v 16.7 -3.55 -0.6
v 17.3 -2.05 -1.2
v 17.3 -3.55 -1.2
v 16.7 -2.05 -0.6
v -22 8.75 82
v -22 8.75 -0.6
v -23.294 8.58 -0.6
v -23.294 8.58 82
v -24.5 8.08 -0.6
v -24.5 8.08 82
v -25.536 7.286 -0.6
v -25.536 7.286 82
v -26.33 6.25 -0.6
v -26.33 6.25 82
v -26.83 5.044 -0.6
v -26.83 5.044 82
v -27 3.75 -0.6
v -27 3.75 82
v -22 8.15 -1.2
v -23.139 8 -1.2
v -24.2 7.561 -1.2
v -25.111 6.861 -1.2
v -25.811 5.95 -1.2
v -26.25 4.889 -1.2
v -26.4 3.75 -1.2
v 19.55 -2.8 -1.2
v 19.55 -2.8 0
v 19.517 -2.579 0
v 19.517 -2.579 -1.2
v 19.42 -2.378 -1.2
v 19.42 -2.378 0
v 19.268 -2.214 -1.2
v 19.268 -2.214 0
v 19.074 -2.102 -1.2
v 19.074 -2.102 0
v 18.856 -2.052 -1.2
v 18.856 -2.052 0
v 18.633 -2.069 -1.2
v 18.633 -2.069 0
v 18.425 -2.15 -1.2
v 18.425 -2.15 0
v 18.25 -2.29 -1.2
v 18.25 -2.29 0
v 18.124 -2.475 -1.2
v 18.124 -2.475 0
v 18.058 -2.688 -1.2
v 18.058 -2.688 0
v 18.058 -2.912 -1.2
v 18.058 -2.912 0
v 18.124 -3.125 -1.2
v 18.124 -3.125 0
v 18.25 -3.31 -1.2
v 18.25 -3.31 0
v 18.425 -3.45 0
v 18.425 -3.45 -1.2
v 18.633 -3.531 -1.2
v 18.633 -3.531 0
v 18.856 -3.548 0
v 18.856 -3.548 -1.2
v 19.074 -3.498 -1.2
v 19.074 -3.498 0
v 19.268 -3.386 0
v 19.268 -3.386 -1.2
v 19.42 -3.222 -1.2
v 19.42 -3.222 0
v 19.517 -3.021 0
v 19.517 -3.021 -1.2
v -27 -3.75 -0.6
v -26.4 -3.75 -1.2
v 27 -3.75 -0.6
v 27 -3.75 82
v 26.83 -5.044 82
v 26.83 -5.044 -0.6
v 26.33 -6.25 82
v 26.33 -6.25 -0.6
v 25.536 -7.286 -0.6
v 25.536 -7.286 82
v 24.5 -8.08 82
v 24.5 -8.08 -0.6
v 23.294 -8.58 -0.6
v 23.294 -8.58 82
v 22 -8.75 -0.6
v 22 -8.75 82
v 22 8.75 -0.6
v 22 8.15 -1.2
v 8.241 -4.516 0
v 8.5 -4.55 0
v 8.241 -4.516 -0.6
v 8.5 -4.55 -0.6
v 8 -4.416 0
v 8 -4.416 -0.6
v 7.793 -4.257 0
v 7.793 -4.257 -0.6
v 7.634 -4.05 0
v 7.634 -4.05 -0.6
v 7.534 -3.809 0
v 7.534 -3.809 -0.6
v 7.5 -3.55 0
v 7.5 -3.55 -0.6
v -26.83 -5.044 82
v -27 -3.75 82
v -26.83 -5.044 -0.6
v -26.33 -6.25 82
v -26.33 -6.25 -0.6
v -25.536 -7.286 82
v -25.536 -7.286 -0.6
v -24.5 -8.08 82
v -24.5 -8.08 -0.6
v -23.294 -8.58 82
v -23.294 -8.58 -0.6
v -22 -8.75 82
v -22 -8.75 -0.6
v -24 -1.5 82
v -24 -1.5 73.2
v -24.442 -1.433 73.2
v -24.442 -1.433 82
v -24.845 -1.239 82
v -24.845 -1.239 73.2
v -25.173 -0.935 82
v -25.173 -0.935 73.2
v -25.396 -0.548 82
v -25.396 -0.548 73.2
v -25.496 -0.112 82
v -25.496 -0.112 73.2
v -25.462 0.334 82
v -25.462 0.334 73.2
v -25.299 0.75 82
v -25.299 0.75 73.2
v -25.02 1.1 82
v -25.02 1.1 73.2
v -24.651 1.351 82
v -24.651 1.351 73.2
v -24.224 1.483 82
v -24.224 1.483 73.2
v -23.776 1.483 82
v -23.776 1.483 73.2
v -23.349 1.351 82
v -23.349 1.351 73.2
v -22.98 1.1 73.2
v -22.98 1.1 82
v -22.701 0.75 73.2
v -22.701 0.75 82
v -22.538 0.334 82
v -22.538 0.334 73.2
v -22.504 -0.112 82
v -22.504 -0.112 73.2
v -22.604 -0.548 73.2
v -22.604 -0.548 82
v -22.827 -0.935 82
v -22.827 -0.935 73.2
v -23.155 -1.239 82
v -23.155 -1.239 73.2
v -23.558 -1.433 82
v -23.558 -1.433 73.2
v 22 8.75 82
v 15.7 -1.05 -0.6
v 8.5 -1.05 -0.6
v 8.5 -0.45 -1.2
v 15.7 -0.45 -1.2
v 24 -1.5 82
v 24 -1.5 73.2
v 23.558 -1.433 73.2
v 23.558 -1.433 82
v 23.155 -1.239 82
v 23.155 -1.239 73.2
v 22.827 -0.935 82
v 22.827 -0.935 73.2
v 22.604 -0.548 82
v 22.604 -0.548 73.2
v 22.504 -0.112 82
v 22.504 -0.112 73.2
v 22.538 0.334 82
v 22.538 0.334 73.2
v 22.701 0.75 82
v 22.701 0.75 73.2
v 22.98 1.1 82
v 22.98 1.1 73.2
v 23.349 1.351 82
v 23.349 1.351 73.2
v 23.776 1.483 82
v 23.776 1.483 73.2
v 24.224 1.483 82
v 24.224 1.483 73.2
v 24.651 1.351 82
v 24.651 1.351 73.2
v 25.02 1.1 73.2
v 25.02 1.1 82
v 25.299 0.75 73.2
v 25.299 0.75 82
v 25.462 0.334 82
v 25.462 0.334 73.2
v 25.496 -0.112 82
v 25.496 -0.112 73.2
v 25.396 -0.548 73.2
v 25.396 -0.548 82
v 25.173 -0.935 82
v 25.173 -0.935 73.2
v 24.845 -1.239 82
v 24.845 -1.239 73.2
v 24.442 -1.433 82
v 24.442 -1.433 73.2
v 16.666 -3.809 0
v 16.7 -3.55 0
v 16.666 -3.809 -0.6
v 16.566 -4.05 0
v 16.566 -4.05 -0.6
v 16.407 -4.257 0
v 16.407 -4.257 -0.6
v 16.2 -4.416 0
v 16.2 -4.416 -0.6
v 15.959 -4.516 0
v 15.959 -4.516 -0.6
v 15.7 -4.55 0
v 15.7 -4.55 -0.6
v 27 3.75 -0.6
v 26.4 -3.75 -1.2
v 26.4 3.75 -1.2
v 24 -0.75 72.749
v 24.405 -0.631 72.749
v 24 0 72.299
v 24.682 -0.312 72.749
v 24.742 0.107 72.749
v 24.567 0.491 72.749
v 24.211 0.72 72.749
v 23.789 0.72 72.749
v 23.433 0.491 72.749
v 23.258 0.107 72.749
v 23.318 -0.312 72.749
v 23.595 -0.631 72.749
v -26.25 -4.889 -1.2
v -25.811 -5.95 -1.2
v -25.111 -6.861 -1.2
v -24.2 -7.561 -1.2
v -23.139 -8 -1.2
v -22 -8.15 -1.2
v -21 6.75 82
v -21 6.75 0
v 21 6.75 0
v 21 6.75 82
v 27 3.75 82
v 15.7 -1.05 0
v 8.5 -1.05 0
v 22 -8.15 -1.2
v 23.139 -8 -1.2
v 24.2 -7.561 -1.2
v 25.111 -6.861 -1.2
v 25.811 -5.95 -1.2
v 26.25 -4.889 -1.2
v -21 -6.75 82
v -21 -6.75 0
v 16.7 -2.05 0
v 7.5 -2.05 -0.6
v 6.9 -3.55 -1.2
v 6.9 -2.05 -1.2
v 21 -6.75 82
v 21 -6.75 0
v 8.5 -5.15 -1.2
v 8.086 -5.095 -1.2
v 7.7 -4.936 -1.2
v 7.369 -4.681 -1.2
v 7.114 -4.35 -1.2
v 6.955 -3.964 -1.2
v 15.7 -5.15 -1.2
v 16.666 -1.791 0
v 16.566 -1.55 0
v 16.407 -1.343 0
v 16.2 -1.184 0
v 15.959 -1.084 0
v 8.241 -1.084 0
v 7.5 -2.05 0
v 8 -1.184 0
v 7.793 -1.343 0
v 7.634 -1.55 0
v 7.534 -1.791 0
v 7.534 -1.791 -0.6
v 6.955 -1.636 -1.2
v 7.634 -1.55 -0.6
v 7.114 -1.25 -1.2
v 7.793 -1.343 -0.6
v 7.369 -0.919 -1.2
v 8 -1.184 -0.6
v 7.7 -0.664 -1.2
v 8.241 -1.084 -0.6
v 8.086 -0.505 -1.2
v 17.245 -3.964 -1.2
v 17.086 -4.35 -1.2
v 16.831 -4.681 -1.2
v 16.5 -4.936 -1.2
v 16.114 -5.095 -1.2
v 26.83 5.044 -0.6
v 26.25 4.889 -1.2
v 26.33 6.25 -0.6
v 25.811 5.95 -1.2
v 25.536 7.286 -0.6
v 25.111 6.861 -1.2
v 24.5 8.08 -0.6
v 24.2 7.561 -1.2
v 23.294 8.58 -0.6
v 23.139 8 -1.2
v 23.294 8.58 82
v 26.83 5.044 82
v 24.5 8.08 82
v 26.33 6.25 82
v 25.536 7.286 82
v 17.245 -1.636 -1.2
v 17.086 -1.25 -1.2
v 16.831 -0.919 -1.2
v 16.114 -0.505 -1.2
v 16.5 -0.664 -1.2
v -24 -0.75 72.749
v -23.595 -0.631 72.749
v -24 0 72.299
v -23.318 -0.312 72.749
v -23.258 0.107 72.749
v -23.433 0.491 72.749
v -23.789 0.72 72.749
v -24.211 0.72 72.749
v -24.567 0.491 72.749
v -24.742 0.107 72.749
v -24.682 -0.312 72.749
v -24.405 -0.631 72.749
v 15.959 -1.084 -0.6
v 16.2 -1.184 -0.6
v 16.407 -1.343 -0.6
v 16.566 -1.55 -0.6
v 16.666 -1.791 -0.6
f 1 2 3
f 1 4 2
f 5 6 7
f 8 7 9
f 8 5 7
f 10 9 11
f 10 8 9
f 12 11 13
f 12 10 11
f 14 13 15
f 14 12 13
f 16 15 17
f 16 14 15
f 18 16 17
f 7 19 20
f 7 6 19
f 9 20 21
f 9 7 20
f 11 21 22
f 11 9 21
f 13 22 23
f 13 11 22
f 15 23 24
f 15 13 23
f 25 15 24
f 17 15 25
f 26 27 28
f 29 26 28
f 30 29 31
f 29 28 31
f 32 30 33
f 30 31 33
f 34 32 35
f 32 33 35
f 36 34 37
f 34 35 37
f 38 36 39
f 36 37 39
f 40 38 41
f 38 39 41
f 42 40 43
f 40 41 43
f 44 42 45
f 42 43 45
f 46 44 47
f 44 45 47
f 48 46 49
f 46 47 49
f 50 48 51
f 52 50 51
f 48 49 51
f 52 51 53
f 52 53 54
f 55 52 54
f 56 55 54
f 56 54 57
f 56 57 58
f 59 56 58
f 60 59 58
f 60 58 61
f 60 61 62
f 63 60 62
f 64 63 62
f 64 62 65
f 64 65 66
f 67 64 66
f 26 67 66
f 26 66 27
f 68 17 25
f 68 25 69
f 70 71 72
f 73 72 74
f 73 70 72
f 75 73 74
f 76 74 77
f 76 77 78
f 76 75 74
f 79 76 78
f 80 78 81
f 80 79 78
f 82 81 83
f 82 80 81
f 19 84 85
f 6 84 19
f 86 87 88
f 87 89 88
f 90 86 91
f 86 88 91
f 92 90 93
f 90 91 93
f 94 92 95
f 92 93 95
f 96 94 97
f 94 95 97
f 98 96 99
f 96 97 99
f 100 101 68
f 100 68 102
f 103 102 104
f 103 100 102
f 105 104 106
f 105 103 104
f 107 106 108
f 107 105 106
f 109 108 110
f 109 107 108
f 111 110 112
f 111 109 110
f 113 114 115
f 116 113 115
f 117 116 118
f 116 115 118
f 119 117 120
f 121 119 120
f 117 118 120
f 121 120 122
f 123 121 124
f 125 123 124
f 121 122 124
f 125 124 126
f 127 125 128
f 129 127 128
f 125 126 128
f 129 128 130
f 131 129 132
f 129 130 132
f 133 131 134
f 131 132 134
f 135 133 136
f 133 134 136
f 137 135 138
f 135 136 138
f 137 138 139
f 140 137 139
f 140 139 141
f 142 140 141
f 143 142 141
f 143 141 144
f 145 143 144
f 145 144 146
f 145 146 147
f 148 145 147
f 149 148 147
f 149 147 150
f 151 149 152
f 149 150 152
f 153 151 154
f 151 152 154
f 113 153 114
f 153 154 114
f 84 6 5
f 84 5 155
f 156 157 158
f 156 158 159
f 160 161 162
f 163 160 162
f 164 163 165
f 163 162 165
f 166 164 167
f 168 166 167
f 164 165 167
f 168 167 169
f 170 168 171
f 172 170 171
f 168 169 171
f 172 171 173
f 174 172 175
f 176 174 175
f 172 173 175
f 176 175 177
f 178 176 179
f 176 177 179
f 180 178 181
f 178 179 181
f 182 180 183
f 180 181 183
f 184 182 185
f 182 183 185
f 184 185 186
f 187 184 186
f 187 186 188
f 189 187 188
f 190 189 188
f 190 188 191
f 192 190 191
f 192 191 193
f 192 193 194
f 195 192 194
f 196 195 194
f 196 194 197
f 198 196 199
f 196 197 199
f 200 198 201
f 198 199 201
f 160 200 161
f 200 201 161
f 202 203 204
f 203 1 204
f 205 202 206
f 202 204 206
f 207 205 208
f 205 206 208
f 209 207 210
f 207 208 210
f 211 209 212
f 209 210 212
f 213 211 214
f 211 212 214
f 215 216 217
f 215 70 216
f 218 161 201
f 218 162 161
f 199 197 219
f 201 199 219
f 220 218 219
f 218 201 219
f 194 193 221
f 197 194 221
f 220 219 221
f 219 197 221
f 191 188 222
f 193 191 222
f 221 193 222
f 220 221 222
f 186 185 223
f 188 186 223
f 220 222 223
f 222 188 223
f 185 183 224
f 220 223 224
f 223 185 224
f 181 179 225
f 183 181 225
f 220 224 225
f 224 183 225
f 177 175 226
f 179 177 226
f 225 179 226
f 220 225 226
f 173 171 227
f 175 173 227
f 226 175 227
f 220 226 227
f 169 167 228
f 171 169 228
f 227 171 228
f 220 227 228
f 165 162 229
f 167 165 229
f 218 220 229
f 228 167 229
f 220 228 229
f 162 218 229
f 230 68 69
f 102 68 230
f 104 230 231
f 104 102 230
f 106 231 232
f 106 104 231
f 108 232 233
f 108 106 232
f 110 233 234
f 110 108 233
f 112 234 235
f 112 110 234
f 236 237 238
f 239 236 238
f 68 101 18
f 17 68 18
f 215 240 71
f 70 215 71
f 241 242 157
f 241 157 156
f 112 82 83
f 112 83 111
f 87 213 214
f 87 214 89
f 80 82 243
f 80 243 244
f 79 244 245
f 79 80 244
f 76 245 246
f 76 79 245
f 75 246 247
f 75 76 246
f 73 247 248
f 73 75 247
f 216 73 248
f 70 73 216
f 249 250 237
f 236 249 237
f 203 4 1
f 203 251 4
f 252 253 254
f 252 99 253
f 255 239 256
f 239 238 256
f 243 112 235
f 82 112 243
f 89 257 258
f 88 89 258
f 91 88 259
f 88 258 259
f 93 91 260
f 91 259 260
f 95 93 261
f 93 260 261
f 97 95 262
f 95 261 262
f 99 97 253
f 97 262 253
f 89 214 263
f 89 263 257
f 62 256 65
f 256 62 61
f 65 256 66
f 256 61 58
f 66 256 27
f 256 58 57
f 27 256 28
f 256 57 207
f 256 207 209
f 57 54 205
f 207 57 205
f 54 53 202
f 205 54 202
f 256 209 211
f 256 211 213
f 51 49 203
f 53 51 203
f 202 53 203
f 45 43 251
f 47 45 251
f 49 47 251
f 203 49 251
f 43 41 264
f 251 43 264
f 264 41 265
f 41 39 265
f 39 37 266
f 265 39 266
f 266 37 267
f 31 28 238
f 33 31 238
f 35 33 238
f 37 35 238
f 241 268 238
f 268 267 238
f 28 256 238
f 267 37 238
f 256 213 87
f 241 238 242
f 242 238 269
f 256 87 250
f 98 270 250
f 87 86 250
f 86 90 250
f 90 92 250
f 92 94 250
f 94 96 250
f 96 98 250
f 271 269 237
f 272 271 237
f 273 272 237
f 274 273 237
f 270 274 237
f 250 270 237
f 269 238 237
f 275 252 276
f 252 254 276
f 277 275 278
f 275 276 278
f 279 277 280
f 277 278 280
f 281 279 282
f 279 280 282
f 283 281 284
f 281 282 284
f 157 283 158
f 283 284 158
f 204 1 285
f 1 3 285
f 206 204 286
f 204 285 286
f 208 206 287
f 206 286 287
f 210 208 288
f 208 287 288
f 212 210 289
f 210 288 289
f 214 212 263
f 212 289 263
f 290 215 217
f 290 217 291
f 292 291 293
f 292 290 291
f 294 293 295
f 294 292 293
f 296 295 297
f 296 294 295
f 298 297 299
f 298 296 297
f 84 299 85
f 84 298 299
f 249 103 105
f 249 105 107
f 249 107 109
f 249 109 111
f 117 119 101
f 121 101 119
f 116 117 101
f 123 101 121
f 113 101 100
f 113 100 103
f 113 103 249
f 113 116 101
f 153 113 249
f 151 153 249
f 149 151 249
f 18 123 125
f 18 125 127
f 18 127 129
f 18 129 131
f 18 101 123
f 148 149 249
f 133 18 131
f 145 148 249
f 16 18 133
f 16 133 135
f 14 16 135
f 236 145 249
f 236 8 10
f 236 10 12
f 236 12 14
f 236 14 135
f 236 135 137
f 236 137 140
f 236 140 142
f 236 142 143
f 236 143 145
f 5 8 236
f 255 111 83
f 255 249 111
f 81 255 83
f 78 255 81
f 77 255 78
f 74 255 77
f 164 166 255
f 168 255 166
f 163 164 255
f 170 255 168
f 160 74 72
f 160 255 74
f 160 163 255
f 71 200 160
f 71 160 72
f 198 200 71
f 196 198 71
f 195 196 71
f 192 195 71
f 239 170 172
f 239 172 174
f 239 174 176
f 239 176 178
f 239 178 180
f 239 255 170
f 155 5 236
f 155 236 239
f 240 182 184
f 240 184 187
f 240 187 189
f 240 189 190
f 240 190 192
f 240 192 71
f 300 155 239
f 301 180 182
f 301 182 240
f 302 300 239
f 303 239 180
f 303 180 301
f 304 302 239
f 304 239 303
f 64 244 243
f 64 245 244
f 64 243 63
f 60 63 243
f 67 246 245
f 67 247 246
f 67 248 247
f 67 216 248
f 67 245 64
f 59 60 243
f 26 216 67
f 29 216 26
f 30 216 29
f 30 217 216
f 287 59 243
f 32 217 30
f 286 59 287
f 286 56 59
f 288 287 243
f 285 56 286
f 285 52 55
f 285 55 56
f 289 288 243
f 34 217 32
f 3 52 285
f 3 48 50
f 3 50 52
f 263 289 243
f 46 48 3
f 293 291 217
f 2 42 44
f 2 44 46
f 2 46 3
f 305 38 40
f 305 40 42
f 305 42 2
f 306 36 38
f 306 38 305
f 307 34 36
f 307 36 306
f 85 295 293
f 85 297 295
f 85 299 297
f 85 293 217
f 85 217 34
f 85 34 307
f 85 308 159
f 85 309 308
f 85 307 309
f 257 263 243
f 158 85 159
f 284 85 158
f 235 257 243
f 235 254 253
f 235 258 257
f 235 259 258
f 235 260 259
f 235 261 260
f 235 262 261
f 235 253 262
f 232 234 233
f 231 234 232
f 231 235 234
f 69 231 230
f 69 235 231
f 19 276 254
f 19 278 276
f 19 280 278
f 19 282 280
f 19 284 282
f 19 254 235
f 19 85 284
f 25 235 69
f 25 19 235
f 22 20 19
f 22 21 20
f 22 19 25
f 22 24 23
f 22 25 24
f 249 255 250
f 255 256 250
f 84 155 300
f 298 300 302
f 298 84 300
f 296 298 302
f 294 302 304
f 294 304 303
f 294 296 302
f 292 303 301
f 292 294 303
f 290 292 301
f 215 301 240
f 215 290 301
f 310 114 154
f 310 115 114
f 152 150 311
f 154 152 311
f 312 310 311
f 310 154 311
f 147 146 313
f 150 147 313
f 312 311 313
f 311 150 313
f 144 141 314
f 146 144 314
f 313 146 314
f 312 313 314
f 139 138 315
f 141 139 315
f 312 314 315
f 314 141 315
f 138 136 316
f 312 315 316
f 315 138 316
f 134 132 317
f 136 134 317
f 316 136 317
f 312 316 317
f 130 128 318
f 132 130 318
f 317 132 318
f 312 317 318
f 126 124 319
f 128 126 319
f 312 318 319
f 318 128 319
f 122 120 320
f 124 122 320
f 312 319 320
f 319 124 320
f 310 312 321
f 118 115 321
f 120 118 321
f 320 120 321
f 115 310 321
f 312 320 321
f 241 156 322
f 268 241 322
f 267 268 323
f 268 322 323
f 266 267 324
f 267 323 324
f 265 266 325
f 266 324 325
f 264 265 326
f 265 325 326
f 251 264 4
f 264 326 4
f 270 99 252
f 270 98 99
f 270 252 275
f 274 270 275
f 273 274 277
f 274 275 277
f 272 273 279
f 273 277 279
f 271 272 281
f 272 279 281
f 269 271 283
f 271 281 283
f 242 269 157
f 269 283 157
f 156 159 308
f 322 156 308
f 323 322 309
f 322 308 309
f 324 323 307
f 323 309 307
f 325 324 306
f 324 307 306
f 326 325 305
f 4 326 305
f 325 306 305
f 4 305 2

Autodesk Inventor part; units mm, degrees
ref_plane "YZ Plane" through (0, 0, 0) normal (1, 0, 0) x (0, 1, 0)
ref_plane "XZ Plane" through (0, 0, 0) normal (0, 1, 0) x (-1, 0, 0)
ref_plane "XY Plane" through (0, 0, 0) normal (0, 0, 1) x (1, 0, 0)
sketch "Sketch1" plane through (0, 0, 0) normal (0, 0, 1) x (1, 0, 0)
  point P0 (0, 0)
sketch "Sketch2" plane through (0, 0, 0) normal (0, 0, 1) x (1, 0, 0)
  line L0 (-21, 6.75) -> (21, 6.75)
  line L1 (21, 6.75) -> (21, -6.75)
  line L2 (21, -6.75) -> (-21, -6.75)
  line L3 (-21, -6.75) -> (-21, 6.75)
  line L4 (-27, 8.75) -> (27, 8.75)
  line L5 (27, 8.75) -> (27, -8.75)
  line L6 (27, -8.75) -> (-27, -8.75)
  line L7 (-27, -8.75) -> (-27, 8.75)
  point P0 (0, 0)
  dimension "d0" = 42
  dimension "d1" = 13.5
  dimension "d2" = 2
  dimension "d3" = 2
  dimension "d4" = 6
  dimension "d5" = 6
  dimension "d6" = 6.75
  dimension "d7" = 21
extrude "Extrusion1" add sketch "Sketch2" along normal blind 82
sketch "Sketch3" plane through (0, 0, 0) normal (0, 0, -1) x (-1, 0, 0)
  line L0 (-27, -8.75) -> (-27, 8.75) projected
  line L1 (27, 8.75) -> (27, -8.75) projected
  line L2 (-27, 8.75) -> (27, 8.75)
  line L3 (27, 8.75) -> (27, -8.75)
  line L4 (27, -8.75) -> (-27, -8.75)
  line L5 (-27, -8.75) -> (-27, 8.75)
  point P0 (0, 0)
extrude "Extrusion2" add sketch "Sketch3" along normal blind 1.2
fillet "Fillet1" radius 5 4 edges at (-27, 8.75, 40.4) (-27, -8.75, 40.4) (27, 8.75, 40.4) (27, -8.75, 40.4)
sketch "Sketch4" plane through (0, 0, 82) normal (0, 0, 1) x (1, 0, 0)
  line L0 (-21, -6.75) -> (-21, 6.75) projected
  line L1 (21, 6.75) -> (21, -6.75) projected
  line L2 (21, -6.75) -> (-21, -6.75) projected
  point P0 (0, 0)
  point P1 (-24, 0)
  point P2 (24, 0)
  dimension "d13" = 3
  dimension "d14" = 3
  dimension "d15" = 6.75
  dimension "d16" = 6.75
hole "Hole1" at (-24, 0, 82) at (24, 0, 82) direction (0, 0, -1) diameter 3 depth 8.8 tip angle 118
sketch "Sketch5" plane through (0, 0, 0) normal (0, 0, 1) x (1, 0, 0)
  line L0 (7.5, -1.05) -> (16.7, -1.05)
  line L1 (16.7, -1.05) -> (16.7, -4.55)
  line L2 (16.7, -4.55) -> (7.5, -4.55)
  line L3 (7.5, -4.55) -> (7.5, -1.05)
  line L4 (21, -6.75) -> (-21, -6.75) projected
  line L5 (21, 6.75) -> (21, -6.75) projected
  point P0 (0, 0)
  dimension "d24" = 2.2
  dimension "d25" = 3.5
  dimension "d26" = 9.2
  dimension "d27" = 4.3
extrude "Extrusion3" cut sketch "Sketch5" against normal blind 1.2
fillet "Fillet2" radius 1 4 edges at (16.7, -1.05, -0.6) (16.7, -4.55, -0.6) (7.5, -4.55, -0.6) (7.5, -1.05, -0.6)
sketch "Sketch6" plane through (0, 0, 0) normal (0, 0, 1) x (1, 0, 0)
  circle A0 centre (18.8, -2.8) radius 0.75
  line L0 (21, 6.75) -> (21, -6.75) projected
  line L1 (15.7, -4.55) -> (8.5, -4.55) projected
  line L2 (8.5, -1.05) -> (15.7, -1.05) projected
  point P0 (0, 0)
  dimension "d31" = 1.5
  dimension "d32" = 2.2
  dimension "d33" = 1.75
  dimension "d34" = 1.75
extrude "Extrusion4" cut sketch "Sketch6" against normal blind 1.2
chamfer "Chamfer1" distance 0.6 angle 45 8 edges at (12.1, -1.05, -1.2) (7.7929, -1.3429, -1.2) (7.5, -2.8, -1.2) (7.7929, -4.2571, -1.2) (12.1, -4.55, -1.2) (16.4071, -4.2571, -1.2) (16.7, -2.8, -1.2) (16.4071, -1.3429, -1.2)
chamfer "Chamfer2" distance 0.6 angle 45 8 edges at (0, 8.75, -1.2) (25.5355, 7.2855, -1.2) (27, 0, -1.2) (25.5355, -7.2855, -1.2) (0, -8.75, -1.2) (-25.5355, -7.2855, -1.2) (-27, 0, -1.2) (-25.5355, 7.2855, -1.2)
properties part number "base"
